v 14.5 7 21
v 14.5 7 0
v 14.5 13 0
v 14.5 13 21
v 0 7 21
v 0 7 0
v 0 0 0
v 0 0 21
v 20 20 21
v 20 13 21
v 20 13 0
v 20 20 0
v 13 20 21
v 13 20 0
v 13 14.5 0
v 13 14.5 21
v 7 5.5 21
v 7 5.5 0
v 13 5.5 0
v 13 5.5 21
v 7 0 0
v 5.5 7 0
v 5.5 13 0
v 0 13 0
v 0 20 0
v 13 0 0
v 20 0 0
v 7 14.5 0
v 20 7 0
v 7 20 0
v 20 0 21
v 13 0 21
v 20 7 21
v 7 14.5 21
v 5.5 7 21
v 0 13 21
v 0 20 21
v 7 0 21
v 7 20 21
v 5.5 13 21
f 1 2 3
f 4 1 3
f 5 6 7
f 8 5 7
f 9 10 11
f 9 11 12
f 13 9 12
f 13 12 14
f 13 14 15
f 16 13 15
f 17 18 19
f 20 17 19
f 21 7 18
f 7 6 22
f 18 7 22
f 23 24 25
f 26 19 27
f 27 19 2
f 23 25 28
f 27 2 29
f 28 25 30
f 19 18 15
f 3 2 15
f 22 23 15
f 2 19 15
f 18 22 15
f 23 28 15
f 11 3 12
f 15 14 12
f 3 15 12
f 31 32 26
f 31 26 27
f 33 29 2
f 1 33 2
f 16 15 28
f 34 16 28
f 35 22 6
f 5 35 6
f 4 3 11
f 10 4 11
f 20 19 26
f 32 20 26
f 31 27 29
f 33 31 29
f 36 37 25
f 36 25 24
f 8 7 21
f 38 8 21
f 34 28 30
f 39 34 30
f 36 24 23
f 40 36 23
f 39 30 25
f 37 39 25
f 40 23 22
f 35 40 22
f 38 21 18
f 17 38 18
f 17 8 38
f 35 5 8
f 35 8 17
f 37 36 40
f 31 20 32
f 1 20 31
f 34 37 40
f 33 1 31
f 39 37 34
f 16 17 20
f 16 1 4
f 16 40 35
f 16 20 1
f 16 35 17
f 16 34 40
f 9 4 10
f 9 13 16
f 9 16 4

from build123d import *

# Parameters (mm, degrees)
F1_DEPTH = 21
F2_R     = 2.5
F3_DEPTH = 25
F4_R     = 2.5
F5_DEPTH = 25


with BuildPart() as f1:
    # F0 (on Top) → F1 (new body)
    with BuildSketch(Plane.XY):
        Polygon((0, 7), (0, 0), (7, 0), (7, 5.5), (13, 5.5), (13, 0), (20, 0), (20, 7), (14.5, 7), (14.5, 13), (20, 13), (20, 20), (13, 20), (13, 14.5), (7, 14.5), (7, 20), (0, 20), (0, 13), (5.5, 13), (5.5, 7), align=None)
    extrude(amount=F1_DEPTH)

    # F2 (on face) → F3 (cut)
    with BuildSketch(Plane.YZ.offset(14.5)):
        with Locations((10, 70)):
            Circle(F2_R)
    extrude(amount=-F3_DEPTH, mode=Mode.SUBTRACT)

    # F4 (on face) → F5 (cut)
    with BuildSketch(Plane.XZ.offset(-5.5)):
        with Locations((10, 70)):
            Circle(F4_R)
    extrude(amount=-F5_DEPTH, mode=Mode.SUBTRACT)


solid = f1.part
